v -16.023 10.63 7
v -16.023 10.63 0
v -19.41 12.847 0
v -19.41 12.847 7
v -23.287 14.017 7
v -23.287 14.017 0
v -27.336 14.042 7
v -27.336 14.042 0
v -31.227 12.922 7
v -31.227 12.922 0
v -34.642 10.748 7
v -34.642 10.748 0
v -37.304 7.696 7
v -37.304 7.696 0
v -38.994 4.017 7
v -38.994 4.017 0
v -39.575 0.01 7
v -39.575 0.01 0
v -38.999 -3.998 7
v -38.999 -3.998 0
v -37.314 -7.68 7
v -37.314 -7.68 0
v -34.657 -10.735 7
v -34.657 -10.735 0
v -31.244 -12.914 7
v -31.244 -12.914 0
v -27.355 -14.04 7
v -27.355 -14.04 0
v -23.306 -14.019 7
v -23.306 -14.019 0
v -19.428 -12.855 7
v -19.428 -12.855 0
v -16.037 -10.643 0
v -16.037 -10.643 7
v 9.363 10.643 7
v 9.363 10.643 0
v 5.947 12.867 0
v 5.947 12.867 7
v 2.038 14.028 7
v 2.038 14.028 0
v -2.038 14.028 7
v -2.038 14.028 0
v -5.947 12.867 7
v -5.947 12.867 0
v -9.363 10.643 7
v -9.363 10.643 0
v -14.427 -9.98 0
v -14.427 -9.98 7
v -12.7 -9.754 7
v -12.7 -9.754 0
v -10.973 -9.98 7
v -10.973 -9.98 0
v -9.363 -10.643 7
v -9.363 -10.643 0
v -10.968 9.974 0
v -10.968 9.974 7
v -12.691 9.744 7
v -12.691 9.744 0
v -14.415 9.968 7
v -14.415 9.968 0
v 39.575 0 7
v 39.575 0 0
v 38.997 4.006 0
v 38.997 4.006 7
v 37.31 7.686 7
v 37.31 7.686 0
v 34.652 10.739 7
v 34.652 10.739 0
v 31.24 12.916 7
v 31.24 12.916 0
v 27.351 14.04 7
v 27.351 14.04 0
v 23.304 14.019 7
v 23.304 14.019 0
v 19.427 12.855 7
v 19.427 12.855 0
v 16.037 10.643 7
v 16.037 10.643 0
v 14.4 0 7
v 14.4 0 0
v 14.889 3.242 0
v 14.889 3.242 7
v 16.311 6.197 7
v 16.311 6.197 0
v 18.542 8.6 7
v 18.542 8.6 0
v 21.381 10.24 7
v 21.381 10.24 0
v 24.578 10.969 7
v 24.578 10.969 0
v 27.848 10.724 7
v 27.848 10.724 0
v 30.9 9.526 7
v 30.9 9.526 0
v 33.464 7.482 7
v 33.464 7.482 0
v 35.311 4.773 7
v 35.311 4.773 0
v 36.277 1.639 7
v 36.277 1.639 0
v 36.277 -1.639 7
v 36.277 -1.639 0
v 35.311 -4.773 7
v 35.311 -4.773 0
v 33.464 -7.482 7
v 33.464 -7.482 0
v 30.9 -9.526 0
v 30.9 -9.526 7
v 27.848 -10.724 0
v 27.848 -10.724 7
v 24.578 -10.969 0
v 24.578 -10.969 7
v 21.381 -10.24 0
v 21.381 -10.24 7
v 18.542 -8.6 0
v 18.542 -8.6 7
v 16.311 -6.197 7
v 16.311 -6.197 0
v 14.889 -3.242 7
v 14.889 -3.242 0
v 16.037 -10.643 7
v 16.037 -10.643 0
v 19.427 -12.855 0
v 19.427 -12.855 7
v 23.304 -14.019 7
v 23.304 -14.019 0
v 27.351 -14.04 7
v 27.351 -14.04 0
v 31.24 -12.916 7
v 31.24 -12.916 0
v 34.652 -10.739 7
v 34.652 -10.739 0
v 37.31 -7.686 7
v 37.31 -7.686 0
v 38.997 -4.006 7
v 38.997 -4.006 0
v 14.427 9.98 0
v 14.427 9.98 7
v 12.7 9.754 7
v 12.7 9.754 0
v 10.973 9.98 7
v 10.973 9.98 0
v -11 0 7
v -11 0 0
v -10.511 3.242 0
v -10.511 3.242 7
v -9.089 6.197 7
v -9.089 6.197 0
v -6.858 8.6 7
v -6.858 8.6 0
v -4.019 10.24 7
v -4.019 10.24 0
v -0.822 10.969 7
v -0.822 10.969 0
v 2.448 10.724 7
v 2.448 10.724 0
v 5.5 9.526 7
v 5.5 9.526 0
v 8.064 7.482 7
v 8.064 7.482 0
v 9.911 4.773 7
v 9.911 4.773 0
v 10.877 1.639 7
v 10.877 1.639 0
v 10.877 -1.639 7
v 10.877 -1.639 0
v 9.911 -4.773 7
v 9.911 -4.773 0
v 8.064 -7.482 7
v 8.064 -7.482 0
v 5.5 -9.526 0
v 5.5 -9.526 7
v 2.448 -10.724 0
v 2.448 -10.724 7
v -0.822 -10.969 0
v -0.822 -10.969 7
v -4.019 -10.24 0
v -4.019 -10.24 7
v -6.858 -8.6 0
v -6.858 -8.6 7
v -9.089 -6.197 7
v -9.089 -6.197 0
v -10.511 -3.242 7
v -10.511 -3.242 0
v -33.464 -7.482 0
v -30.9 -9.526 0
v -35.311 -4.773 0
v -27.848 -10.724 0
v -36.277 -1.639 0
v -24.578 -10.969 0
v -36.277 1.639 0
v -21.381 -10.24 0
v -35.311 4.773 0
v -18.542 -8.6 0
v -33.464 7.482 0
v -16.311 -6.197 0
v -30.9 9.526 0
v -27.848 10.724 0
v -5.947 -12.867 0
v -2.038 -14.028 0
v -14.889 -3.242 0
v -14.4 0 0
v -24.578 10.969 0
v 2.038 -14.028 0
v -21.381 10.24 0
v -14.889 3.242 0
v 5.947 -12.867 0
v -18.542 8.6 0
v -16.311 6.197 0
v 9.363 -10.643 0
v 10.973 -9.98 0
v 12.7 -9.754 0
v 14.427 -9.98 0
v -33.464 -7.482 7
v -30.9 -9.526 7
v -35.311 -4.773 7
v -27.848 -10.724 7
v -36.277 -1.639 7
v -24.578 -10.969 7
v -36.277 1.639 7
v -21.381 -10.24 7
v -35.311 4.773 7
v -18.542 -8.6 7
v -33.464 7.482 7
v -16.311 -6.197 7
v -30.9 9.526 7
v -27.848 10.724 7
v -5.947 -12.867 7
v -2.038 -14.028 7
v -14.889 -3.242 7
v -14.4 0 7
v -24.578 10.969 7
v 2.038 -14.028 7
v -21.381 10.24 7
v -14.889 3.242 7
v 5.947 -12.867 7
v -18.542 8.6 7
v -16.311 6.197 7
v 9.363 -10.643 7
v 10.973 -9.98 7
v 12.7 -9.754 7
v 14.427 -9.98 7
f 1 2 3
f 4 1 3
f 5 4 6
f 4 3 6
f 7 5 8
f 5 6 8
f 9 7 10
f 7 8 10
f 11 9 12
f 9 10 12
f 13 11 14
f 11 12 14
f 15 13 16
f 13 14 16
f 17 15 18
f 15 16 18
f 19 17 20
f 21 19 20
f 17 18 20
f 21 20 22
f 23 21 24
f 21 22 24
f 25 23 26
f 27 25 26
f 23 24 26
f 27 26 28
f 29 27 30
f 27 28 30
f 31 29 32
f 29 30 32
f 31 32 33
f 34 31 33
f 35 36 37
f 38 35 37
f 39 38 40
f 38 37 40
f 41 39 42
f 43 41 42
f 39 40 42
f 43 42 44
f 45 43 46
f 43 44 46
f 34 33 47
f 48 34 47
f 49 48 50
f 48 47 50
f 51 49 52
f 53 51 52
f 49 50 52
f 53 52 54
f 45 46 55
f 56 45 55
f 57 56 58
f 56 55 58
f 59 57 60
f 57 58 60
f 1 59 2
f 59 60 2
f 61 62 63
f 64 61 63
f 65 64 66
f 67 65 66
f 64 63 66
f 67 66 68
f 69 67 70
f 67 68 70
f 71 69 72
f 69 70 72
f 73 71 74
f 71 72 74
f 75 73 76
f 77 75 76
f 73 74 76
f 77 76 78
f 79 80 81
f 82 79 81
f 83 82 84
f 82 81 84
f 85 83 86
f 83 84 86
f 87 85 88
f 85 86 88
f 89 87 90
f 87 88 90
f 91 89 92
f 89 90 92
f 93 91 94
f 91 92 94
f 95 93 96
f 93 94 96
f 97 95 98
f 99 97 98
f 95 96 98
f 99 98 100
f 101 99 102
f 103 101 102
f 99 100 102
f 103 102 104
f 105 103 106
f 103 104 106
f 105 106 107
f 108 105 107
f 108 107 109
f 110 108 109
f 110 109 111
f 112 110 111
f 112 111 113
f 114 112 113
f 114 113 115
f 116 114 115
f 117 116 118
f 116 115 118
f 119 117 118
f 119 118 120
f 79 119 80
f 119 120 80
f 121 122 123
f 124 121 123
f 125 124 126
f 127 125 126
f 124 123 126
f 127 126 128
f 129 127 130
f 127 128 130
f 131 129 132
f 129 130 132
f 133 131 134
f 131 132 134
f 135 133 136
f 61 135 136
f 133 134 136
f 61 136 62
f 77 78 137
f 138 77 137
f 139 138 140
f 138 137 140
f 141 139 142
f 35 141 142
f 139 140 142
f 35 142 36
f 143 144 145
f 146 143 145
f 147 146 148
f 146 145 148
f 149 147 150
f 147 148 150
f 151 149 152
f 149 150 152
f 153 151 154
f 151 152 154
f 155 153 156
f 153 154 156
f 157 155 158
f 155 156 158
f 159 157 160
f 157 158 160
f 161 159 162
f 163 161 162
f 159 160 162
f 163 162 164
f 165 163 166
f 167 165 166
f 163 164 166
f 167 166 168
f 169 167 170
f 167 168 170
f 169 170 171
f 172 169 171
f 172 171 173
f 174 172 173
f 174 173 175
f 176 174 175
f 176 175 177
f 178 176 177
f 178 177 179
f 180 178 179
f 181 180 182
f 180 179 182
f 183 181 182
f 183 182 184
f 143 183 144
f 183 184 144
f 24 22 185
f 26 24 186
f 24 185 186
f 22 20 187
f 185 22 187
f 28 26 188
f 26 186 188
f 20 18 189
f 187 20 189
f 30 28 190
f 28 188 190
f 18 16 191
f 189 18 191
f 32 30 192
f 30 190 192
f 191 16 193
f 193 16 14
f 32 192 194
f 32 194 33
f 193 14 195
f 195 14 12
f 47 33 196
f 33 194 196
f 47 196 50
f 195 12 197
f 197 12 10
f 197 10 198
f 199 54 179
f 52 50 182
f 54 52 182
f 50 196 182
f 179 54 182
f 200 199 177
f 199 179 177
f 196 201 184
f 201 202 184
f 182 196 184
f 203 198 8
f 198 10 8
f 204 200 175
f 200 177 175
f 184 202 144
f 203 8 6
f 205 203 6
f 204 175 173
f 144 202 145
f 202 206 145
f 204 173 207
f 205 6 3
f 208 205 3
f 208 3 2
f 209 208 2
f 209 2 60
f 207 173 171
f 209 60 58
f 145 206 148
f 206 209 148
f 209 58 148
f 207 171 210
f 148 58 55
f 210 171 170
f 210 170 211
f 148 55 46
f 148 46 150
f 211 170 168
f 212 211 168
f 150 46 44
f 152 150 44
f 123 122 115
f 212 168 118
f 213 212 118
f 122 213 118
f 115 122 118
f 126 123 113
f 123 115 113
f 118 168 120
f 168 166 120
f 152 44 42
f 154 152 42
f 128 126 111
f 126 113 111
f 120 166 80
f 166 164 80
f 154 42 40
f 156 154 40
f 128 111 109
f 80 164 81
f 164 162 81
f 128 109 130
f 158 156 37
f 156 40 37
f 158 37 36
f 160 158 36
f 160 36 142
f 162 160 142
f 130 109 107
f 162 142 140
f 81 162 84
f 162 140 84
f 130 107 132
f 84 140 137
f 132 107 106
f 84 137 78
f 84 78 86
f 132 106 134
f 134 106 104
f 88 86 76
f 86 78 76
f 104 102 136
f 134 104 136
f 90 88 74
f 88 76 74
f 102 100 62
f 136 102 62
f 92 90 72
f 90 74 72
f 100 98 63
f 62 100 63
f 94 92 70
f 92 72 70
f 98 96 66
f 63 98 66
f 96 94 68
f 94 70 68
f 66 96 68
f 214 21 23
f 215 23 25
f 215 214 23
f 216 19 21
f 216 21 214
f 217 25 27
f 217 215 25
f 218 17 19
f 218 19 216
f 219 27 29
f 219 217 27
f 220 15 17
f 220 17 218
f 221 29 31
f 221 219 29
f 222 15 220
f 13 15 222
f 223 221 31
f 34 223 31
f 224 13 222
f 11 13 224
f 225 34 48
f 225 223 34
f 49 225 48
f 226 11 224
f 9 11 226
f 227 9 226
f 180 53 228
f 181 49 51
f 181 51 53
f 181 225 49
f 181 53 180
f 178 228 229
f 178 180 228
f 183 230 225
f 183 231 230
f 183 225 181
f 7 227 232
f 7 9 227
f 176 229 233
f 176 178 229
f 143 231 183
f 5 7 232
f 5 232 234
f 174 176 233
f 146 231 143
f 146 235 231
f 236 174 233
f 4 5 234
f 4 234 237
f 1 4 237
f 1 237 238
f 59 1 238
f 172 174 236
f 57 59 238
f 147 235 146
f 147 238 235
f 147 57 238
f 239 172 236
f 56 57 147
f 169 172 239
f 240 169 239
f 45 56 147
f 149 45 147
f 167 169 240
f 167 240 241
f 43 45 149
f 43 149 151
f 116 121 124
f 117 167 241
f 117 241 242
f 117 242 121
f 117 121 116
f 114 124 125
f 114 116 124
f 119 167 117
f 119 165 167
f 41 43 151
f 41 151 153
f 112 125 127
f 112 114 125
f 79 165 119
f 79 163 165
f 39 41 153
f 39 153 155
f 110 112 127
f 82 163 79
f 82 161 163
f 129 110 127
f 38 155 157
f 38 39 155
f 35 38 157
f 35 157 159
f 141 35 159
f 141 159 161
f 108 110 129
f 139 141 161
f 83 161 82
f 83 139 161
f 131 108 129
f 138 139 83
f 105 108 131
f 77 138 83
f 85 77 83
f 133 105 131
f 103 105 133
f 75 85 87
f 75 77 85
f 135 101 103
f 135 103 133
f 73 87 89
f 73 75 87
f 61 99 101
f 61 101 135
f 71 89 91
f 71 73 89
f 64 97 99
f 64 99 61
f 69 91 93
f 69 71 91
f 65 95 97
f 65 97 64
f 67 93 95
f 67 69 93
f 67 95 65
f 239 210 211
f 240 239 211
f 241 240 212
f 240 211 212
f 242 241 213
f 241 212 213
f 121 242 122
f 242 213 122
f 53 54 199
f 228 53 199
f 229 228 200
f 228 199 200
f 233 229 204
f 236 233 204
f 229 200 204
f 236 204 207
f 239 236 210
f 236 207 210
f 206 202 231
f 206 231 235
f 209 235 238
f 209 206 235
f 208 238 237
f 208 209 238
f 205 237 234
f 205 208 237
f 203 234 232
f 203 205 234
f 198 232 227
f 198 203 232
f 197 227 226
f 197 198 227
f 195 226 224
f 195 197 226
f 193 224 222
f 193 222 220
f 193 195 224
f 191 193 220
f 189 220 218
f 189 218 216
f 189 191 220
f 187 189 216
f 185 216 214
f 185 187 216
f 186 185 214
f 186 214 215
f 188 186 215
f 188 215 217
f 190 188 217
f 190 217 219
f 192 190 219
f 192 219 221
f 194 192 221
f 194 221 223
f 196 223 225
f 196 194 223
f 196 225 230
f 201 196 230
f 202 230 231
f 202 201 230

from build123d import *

# Parameters (mm, degrees)
F0_R     = 11
F1_DEPTH = 7


with BuildPart() as f1:
    # F0 (on Top) → F1 (new body)
    with BuildSketch(Plane.XY):
        with BuildLine():
            ThreePointArc((-12.7, -6.29608), (-13.801325, -3.233274), (-14.175, 0))
            ThreePointArc((-14.175, 0), (-13.801325, 3.233274), (-12.7, 6.29608))
            ThreePointArc((-12.7, 6.29608), (-14.150621, 8.624506), (-16.022588, 10.6299))
            ThreePointArc((-16.022588, 10.6299), (-39.574997, 0.009606), (-16.037004, -10.6426))
            ThreePointArc((-16.037004, -10.6426), (-14.156468, -8.632127), (-12.7, -6.29608))
        make_face()
        with Locations((-25.4, 0)):
            Circle(F0_R, mode=Mode.SUBTRACT)
        with BuildLine():
            Line((11.225, 0), (11, 0))
            ThreePointArc((11, 0), (0, -11), (-11, 0))
            Line((-11, 0), (-11.225, 0))
            ThreePointArc((-11.225, 0), (-11.598675, -3.233274), (-12.7, -6.29608))
            ThreePointArc((-12.7, -6.29608), (-11.243532, -8.632127), (-9.362996, -10.6426))
            ThreePointArc((-9.362996, -10.6426), (0, -14.175), (9.362996, -10.6426))
            ThreePointArc((9.362996, -10.6426), (11.243532, -8.632127), (12.7, -6.29608))
            ThreePointArc((12.7, -6.29608), (11.598675, -3.233274), (11.225, 0))
        make_face()
        with BuildLine():
            ThreePointArc((-16.022588, 10.6299), (-14.150621, 8.624506), (-12.7, 6.29608))
            ThreePointArc((-12.7, 6.29608), (-11.243532, 8.632127), (-9.362996, 10.6426))
            ThreePointArc((-9.362996, 10.6426), (-12.691091, 9.744086), (-16.022588, 10.6299))
        make_face()
        with BuildLine():
            ThreePointArc((-12.7, -6.29608), (-11.598675, -3.233274), (-11.225, 0))
            Line((-11.225, 0), (-14.175, 0))
            ThreePointArc((-14.175, 0), (-13.801325, -3.233274), (-12.7, -6.29608))
        make_face()
        with BuildLine():
            Line((-14.175, 0), (-11.225, 0))
            ThreePointArc((-11.225, 0), (-11.598675, 3.233274), (-12.7, 6.29608))
            ThreePointArc((-12.7, 6.29608), (-13.801325, 3.233274), (-14.175, 0))
        make_face()
        with BuildLine():
            ThreePointArc((-11, 0), (0, 11), (11, 0))
            Line((11, 0), (11.225, 0))
            ThreePointArc((11.225, 0), (11.598675, 3.233274), (12.7, 6.29608))
            ThreePointArc((12.7, 6.29608), (11.243532, 8.632127), (9.362996, 10.6426))
            ThreePointArc((9.362996, 10.6426), (0, 14.175), (-9.362996, 10.6426))
            ThreePointArc((-9.362996, 10.6426), (-11.243532, 8.632127), (-12.7, 6.29608))
            ThreePointArc((-12.7, 6.29608), (-11.598675, 3.233274), (-11.225, 0))
            Line((-11.225, 0), (-11, 0))
        make_face()
        with BuildLine():
            ThreePointArc((-9.362996, -10.6426), (-11.243532, -8.632127), (-12.7, -6.29608))
            ThreePointArc((-12.7, -6.29608), (-14.156468, -8.632127), (-16.037004, -10.6426))
            ThreePointArc((-16.037004, -10.6426), (-12.7, -9.7536), (-9.362996, -10.6426))
        make_face()
        with BuildLine():
            ThreePointArc((16.037004, -10.6426), (14.156468, -8.632127), (12.7, -6.29608))
            ThreePointArc((12.7, -6.29608), (11.243532, -8.632127), (9.362996, -10.6426))
            ThreePointArc((9.362996, -10.6426), (12.7, -9.7536), (16.037004, -10.6426))
        make_face()
        with BuildLine():
            ThreePointArc((12.7, 6.29608), (13.801325, 3.233274), (14.175, 0))
            ThreePointArc((14.175, 0), (13.801325, -3.233274), (12.7, -6.29608))
            ThreePointArc((12.7, -6.29608), (14.156468, -8.632127), (16.037004, -10.6426))
            ThreePointArc((16.037004, -10.6426), (31.239955, -12.916096), (39.575, 0))
            ThreePointArc((39.575, 0), (31.239955, 12.916096), (16.037004, 10.6426))
            ThreePointArc((16.037004, 10.6426), (14.156468, 8.632127), (12.7, 6.29608))
        make_face()
        with BuildLine():
            ThreePointArc((36.4, 0), (25.4, -11), (14.4, 0))
            ThreePointArc((14.4, 0), (25.4, 11), (36.4, 0))
        make_face(mode=Mode.SUBTRACT)
        with BuildLine():
            ThreePointArc((12.7, 6.29608), (11.598675, 3.233274), (11.225, 0))
            Line((11.225, 0), (14.175, 0))
            ThreePointArc((14.175, 0), (13.801325, 3.233274), (12.7, 6.29608))
        make_face()
        with BuildLine():
            Line((14.175, 0), (11.225, 0))
            ThreePointArc((11.225, 0), (11.598675, -3.233274), (12.7, -6.29608))
            ThreePointArc((12.7, -6.29608), (13.801325, -3.233274), (14.175, 0))
        make_face()
        with BuildLine():
            ThreePointArc((9.362996, 10.6426), (11.243532, 8.632127), (12.7, 6.29608))
            ThreePointArc((12.7, 6.29608), (14.156468, 8.632127), (16.037004, 10.6426))
            ThreePointArc((16.037004, 10.6426), (12.7, 9.7536), (9.362996, 10.6426))
        make_face()
    extrude(amount=F1_DEPTH)


solid = f1.part
